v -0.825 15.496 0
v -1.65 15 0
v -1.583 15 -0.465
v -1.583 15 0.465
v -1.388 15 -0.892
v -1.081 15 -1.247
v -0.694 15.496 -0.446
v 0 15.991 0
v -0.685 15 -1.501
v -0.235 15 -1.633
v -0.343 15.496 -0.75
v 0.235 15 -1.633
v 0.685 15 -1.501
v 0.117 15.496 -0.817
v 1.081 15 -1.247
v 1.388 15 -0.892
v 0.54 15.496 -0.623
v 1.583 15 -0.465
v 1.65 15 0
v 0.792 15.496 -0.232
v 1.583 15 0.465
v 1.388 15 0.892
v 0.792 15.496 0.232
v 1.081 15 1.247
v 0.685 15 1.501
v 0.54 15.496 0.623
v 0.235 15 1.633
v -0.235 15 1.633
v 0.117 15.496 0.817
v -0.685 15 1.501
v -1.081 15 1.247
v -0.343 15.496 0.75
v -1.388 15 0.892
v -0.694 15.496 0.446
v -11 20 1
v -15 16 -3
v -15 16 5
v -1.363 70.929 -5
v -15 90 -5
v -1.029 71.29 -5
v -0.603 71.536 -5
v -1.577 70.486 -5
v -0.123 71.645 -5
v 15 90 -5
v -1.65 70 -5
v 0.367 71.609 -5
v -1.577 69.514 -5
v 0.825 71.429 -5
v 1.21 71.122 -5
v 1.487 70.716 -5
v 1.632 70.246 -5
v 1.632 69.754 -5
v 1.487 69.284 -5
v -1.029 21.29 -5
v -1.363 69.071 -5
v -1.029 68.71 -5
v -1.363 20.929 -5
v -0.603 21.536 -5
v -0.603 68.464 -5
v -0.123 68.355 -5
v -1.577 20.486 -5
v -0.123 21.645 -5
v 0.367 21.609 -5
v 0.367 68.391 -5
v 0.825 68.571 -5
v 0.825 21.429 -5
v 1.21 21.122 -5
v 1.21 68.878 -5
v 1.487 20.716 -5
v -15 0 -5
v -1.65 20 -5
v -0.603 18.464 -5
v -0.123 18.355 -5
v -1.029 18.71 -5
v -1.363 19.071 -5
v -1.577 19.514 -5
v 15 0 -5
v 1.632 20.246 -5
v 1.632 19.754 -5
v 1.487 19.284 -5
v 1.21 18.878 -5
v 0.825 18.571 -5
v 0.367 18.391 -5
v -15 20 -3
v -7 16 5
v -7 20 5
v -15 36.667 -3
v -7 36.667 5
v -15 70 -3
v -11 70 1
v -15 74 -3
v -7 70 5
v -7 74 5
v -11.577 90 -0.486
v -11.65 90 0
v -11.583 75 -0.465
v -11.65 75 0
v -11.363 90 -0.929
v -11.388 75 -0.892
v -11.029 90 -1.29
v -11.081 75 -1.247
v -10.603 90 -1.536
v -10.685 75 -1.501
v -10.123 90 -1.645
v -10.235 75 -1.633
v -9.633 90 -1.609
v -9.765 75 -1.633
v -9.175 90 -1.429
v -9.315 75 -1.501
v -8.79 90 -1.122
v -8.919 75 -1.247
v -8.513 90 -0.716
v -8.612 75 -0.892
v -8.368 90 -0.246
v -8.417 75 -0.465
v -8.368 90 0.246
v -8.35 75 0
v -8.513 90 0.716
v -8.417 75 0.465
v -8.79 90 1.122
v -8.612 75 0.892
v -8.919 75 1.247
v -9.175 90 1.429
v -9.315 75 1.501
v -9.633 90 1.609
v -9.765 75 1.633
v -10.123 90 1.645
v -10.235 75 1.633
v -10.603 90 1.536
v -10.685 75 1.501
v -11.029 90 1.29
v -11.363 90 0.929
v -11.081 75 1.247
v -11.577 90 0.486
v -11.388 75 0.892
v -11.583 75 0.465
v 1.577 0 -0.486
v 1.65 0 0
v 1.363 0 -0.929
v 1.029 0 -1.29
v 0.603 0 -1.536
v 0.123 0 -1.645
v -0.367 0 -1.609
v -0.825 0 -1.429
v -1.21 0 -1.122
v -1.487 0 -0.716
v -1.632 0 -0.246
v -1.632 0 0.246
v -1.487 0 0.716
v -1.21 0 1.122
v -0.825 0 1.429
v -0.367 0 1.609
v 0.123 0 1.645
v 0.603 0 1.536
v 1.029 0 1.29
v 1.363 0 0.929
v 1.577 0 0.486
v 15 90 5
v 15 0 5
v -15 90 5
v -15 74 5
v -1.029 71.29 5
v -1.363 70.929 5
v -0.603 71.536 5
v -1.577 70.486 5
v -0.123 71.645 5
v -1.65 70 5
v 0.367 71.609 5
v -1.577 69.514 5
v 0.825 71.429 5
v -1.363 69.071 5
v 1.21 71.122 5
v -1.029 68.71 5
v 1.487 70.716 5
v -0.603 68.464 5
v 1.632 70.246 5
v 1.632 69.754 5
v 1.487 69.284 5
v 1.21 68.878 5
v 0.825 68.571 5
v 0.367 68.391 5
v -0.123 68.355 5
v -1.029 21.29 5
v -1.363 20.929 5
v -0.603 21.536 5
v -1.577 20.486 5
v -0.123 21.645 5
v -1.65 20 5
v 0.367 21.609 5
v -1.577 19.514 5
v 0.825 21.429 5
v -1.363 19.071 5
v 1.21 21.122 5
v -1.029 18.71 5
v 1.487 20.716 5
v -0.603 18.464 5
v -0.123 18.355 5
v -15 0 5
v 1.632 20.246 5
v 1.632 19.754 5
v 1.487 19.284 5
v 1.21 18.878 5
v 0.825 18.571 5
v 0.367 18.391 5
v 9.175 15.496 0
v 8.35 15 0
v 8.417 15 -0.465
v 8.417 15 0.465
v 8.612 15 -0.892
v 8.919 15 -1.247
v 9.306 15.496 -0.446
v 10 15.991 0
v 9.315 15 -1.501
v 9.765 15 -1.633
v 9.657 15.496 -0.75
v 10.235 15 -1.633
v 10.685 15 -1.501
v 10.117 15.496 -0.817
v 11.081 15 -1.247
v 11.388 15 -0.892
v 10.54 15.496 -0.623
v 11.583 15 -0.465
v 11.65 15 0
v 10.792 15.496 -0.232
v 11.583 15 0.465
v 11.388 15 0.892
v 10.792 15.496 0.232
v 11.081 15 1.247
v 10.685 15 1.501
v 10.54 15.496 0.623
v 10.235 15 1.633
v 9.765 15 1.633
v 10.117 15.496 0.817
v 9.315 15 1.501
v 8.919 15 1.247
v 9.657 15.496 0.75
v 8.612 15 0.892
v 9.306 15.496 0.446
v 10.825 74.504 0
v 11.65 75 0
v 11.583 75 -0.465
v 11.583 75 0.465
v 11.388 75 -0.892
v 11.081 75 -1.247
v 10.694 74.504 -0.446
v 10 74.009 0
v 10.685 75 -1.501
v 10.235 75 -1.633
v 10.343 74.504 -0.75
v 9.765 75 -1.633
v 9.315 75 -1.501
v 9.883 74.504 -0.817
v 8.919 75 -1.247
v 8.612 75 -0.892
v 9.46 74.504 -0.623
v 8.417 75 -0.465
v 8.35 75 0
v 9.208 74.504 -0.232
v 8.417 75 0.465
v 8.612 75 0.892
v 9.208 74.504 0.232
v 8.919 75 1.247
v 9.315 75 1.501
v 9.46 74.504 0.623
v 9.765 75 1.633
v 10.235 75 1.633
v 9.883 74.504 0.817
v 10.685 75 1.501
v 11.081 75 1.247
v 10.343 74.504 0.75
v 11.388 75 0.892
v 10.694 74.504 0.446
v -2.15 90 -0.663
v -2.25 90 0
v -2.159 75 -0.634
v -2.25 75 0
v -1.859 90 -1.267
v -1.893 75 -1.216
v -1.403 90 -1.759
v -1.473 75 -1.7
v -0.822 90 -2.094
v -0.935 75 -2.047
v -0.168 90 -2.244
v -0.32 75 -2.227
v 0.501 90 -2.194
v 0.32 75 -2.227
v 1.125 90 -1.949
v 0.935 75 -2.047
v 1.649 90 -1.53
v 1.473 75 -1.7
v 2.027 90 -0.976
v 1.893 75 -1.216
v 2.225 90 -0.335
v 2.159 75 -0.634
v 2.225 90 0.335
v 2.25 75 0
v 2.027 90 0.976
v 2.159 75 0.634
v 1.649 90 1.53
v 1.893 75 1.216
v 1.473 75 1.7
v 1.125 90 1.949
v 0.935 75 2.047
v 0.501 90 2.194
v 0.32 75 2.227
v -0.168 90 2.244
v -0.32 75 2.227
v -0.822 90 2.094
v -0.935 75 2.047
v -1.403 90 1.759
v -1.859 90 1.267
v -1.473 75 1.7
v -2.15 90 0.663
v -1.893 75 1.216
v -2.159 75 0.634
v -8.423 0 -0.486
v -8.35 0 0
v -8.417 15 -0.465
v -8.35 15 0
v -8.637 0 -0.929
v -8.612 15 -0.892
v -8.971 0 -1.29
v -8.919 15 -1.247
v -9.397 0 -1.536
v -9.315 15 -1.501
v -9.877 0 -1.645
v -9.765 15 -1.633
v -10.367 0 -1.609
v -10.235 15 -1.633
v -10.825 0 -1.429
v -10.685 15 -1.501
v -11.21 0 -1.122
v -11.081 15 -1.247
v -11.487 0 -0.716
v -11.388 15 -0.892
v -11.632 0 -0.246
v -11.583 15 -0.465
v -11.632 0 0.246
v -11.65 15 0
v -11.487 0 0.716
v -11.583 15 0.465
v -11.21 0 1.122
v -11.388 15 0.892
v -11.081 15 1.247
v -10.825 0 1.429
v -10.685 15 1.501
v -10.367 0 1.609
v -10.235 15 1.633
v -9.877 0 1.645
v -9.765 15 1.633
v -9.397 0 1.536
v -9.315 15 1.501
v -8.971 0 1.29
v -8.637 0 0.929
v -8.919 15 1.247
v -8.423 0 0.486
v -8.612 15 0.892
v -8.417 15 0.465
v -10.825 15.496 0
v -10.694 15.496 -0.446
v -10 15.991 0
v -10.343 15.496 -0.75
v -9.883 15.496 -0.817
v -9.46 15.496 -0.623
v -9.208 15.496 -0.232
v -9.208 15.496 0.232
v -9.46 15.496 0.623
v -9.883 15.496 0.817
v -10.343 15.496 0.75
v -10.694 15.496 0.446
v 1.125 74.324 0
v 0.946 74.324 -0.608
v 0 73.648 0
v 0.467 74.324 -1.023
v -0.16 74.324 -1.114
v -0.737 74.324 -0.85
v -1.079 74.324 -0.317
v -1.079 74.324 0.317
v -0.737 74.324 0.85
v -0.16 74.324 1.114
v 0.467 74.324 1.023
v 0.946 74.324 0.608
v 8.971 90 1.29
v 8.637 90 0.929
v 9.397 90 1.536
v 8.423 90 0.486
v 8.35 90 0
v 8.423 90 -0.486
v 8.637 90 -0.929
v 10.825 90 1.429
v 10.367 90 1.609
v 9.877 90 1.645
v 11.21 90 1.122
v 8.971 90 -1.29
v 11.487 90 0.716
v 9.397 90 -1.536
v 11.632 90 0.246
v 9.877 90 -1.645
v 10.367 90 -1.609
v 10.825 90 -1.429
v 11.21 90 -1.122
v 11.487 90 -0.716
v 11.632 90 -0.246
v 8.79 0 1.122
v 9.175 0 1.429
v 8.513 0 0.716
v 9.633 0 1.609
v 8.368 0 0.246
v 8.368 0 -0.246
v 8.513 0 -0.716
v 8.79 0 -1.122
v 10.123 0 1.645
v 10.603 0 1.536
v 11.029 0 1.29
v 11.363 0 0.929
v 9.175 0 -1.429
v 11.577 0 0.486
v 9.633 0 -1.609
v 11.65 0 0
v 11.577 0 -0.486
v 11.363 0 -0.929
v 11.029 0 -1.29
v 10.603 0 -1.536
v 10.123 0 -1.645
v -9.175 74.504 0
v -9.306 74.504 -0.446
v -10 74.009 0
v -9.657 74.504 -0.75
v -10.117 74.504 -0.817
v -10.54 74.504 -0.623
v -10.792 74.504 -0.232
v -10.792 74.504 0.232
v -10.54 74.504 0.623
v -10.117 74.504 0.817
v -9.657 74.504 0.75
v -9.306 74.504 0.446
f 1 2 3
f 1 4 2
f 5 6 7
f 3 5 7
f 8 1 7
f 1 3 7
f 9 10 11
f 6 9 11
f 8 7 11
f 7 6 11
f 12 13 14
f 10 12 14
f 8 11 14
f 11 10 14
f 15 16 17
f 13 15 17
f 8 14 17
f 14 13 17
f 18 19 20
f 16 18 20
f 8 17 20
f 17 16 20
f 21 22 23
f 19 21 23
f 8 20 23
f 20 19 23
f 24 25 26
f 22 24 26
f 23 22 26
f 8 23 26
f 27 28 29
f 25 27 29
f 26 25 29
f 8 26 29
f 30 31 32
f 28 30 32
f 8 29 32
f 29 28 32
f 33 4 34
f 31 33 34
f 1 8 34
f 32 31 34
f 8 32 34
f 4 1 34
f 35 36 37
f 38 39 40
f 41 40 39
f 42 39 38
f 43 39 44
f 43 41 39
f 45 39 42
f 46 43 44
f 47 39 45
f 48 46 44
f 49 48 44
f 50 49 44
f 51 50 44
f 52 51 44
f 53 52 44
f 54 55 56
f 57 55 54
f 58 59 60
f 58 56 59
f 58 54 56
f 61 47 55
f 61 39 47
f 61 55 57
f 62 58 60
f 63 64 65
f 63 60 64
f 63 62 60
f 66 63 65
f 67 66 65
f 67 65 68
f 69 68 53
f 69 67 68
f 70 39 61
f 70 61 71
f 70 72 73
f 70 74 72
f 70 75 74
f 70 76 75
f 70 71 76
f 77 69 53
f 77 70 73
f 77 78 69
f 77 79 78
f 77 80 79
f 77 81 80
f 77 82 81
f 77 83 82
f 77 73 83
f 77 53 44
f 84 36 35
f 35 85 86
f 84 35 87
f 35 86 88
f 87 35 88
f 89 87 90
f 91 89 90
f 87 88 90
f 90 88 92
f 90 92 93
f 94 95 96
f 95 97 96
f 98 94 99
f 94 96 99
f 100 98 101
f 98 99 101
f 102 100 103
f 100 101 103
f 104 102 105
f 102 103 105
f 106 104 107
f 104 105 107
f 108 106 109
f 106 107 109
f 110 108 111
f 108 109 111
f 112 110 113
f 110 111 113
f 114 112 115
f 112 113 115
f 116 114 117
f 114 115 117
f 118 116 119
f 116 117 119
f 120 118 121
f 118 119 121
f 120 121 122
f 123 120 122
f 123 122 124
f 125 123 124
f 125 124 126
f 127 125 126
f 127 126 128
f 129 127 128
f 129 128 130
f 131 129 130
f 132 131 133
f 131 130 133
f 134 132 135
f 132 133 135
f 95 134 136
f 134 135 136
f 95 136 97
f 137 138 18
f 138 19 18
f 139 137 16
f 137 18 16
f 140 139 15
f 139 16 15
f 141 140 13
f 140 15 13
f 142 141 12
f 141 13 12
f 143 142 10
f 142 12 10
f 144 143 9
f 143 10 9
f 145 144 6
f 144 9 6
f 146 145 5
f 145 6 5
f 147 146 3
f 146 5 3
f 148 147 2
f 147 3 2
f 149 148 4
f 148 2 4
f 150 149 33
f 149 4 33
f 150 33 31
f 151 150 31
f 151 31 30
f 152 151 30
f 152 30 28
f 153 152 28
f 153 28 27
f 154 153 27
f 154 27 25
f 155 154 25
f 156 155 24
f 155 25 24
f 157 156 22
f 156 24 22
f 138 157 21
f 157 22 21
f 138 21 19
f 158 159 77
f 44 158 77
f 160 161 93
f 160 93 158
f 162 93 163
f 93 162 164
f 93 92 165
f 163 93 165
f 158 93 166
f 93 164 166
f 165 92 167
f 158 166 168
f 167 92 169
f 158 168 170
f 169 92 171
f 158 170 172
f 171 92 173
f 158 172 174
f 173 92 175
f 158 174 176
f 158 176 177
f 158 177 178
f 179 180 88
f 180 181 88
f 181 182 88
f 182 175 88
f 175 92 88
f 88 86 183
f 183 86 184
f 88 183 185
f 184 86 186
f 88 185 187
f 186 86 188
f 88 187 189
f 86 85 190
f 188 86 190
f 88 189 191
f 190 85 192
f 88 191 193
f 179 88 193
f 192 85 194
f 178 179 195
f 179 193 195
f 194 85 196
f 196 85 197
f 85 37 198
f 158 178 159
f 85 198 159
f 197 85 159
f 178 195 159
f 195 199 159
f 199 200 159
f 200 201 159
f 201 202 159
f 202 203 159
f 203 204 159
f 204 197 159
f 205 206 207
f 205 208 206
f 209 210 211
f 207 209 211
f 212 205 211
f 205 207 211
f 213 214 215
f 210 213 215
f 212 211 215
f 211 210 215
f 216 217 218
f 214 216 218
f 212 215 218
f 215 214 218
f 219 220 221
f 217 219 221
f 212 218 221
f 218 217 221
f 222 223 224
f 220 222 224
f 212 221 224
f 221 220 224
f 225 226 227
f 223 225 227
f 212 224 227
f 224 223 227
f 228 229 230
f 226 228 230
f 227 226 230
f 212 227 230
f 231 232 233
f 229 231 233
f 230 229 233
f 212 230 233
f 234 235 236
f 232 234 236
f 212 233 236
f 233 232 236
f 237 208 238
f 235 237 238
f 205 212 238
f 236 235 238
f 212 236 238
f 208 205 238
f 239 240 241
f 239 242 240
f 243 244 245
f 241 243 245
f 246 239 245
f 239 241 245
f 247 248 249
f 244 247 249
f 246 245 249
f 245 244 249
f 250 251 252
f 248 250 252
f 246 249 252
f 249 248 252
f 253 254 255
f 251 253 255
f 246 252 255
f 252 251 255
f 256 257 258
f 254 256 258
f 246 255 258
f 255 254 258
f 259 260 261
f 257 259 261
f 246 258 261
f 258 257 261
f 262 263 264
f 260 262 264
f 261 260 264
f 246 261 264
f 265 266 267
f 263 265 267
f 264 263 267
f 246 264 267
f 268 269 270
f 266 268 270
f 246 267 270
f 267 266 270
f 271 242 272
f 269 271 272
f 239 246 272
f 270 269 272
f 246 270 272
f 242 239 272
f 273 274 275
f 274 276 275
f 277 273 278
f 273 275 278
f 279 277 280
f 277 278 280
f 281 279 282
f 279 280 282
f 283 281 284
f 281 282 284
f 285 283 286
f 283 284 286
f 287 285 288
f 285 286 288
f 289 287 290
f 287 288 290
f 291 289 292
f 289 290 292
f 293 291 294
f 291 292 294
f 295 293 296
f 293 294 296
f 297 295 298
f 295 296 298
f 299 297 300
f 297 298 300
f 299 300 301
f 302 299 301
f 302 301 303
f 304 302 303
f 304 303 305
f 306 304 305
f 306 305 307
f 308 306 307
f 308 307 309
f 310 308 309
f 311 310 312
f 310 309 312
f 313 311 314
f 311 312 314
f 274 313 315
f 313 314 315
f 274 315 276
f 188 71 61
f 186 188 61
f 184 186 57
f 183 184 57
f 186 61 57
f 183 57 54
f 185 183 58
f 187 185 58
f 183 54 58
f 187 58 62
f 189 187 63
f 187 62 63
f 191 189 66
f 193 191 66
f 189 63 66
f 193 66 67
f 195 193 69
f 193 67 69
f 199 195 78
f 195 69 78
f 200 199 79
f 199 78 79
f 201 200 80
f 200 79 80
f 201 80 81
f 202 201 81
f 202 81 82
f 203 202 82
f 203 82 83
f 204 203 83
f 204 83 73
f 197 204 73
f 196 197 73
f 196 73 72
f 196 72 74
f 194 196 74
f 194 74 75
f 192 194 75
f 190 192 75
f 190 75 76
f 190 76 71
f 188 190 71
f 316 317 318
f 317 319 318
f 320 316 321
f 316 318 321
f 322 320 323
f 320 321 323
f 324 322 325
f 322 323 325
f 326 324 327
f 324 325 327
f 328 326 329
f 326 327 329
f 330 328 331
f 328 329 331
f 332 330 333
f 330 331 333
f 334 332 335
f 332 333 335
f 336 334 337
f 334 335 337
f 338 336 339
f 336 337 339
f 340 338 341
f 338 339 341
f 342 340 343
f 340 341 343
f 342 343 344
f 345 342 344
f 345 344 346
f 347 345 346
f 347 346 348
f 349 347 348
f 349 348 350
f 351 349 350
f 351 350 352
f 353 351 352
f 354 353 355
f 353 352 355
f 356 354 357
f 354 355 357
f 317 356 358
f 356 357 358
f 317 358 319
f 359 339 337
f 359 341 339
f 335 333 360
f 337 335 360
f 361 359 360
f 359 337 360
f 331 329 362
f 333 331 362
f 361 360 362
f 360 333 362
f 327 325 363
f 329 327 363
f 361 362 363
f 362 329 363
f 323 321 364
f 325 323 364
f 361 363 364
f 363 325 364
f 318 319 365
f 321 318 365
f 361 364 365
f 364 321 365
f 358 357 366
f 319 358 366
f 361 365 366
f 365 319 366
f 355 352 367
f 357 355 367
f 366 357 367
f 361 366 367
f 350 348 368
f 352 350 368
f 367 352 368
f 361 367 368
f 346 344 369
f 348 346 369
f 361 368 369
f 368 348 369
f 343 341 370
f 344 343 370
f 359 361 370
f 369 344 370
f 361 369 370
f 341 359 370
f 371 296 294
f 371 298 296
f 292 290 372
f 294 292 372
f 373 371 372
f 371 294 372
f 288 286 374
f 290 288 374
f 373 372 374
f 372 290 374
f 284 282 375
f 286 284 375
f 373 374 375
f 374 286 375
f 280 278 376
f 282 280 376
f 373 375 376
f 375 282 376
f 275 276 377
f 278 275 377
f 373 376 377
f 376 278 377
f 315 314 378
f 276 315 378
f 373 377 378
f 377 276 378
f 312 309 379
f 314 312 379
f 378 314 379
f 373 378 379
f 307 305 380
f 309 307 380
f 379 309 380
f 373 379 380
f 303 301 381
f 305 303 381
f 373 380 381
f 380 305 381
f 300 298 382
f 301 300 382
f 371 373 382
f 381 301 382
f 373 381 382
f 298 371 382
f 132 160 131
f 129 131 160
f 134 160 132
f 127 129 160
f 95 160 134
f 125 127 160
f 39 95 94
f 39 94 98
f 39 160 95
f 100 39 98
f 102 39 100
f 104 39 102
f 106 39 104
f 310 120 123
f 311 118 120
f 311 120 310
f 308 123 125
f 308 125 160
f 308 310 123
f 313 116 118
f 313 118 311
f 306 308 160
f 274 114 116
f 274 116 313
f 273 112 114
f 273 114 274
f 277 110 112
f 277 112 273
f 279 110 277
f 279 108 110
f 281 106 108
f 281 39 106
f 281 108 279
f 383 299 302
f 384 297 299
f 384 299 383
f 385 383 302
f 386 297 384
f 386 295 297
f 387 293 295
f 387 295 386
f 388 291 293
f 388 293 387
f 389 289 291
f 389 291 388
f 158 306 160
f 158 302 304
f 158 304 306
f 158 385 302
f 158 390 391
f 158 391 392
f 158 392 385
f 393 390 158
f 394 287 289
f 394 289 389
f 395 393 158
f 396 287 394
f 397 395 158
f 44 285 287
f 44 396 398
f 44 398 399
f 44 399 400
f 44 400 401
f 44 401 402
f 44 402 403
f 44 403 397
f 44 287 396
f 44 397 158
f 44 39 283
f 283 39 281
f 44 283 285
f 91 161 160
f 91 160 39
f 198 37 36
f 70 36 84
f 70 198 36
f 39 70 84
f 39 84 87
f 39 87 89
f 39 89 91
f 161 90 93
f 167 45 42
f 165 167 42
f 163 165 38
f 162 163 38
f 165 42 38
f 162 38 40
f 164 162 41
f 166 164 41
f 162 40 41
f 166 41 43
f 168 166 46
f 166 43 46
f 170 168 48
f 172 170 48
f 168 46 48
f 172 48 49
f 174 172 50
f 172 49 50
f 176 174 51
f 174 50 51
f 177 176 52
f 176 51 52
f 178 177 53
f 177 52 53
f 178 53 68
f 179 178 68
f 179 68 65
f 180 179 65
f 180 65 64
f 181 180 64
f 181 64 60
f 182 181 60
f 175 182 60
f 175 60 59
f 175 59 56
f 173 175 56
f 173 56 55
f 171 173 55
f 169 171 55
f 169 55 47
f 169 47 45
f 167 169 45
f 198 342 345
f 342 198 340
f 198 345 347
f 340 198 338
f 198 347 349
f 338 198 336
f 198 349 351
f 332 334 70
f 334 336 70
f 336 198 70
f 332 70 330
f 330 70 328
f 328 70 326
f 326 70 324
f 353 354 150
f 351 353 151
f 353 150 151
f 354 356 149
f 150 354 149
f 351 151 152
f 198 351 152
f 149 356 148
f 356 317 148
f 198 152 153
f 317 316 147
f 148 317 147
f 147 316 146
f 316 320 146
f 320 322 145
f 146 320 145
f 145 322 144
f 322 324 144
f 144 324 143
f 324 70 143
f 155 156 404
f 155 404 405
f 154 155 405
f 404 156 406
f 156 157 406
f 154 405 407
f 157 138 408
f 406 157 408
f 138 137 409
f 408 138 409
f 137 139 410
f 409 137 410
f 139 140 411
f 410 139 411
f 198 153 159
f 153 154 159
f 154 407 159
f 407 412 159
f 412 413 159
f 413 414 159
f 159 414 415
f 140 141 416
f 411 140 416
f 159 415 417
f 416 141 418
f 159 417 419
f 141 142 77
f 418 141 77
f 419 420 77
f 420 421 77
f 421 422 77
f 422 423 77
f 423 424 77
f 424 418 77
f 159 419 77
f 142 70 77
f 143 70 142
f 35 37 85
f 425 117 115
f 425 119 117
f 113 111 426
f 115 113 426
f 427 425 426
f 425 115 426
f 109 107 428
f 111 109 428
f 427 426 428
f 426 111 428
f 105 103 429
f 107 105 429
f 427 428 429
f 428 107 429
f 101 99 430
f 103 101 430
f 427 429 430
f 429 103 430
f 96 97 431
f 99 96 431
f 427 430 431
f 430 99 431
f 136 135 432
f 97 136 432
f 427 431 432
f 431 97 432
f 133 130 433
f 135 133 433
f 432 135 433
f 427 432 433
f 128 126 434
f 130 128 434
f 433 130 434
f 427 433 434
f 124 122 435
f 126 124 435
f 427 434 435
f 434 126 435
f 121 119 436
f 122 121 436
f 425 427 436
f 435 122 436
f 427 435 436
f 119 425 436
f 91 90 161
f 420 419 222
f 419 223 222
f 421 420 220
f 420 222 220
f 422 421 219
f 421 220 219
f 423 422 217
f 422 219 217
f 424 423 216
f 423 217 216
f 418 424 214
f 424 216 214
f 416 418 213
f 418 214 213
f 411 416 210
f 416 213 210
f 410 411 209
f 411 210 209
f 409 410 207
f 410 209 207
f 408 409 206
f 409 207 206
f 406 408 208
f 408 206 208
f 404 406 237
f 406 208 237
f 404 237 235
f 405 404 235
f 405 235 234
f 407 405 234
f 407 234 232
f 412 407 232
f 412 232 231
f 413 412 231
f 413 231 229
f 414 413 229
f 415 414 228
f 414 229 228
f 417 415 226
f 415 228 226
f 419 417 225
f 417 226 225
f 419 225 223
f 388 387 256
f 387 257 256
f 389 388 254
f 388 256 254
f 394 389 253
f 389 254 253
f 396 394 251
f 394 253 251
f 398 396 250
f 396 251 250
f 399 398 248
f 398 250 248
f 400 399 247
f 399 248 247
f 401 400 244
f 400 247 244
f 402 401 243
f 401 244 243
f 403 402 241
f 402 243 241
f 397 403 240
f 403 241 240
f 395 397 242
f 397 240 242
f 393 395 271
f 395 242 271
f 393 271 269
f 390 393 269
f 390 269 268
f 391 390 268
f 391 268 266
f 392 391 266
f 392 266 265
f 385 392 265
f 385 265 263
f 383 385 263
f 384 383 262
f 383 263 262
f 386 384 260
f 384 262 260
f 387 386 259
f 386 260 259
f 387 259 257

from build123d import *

# Parameters (mm, degrees)
SKETCH1_W                 = 30
SKETCH1_H                 = 10
BOSS_EXTRUDE1_DEPTH       = 90
M4X0_7_TAPPED_HOLE1_D     = 3.3
M4X0_7_TAPPED_HOLE1_DEPTH = 15
M4X0_7_TAPPED_HOLE1_TIP   = 0.991420021
M4X0_7_TAPPED_HOLE2_D     = 3.3
M4X0_7_TAPPED_HOLE2_DEPTH = 15
M4X0_7_TAPPED_HOLE2_TIP   = 0.991420021
M4X0_7_TAPPED_HOLE3_D     = 3.3
M4_CLEARANCE_HOLE1_D      = 4.5
M4_CLEARANCE_HOLE1_DEPTH  = 15
M4_CLEARANCE_HOLE1_TIP    = 1.351936393
SKETCH13_W                = 8
SKETCH13_H                = 50
CUT_EXTRUDE1_DEPTH        = 8
CHAMFER4_SIZE             = 8
CHAMFER5_SIZE             = 4


# Some blends are built 0.0001 mm under size
with BuildPart() as part:
    # Sketch1 → Boss-Extrude1 (new body)
    with BuildSketch(Plane(origin=(0, 0, 0), x_dir=(1, 0, 0), z_dir=(0, 1, 0))):
        Rectangle(SKETCH1_W, SKETCH1_H)
    extrude(amount=BOSS_EXTRUDE1_DEPTH)

    # M4x0.7 Tapped Hole1
    with Locations(Plane(origin=(0, 0, 0), x_dir=(-1, 0, 0), z_dir=(0, -1, 0))):
        with Locations((-10, 0), (10, 0), (0, 0)):
            Hole(M4X0_7_TAPPED_HOLE1_D / 2, depth=M4X0_7_TAPPED_HOLE1_DEPTH)
            with Locations((0, 0, -(M4X0_7_TAPPED_HOLE1_DEPTH + M4X0_7_TAPPED_HOLE1_TIP / 2))):  # 118° drill point
                Cone(0, M4X0_7_TAPPED_HOLE1_D / 2, M4X0_7_TAPPED_HOLE1_TIP, mode=Mode.SUBTRACT)

    # M4x0.7 Tapped Hole2
    with Locations(Plane(origin=(0, 90, 0), x_dir=(1, 0, 0), z_dir=(0, 1, 0))):
        with Locations((-10, 0), (10, 0)):
            Hole(M4X0_7_TAPPED_HOLE2_D / 2, depth=M4X0_7_TAPPED_HOLE2_DEPTH)
            with Locations((0, 0, -(M4X0_7_TAPPED_HOLE2_DEPTH + M4X0_7_TAPPED_HOLE2_TIP / 2))):  # 118° drill point
                Cone(0, M4X0_7_TAPPED_HOLE2_D / 2, M4X0_7_TAPPED_HOLE2_TIP, mode=Mode.SUBTRACT)

    # M4x0.7 Tapped Hole3 (through all)
    with Locations(Plane.XY.offset(5)):
        with Locations((0, 70), (0, 20)):
            Hole(M4X0_7_TAPPED_HOLE3_D / 2)

    # M4 Clearance Hole1
    with Locations(Plane(origin=(0, 90, 0), x_dir=(1, 0, 0), z_dir=(0, 1, 0))):
        with Locations((0, 0)):
            Hole(M4_CLEARANCE_HOLE1_D / 2, depth=M4_CLEARANCE_HOLE1_DEPTH)
            with Locations((0, 0, -(M4_CLEARANCE_HOLE1_DEPTH + M4_CLEARANCE_HOLE1_TIP / 2))):  # 118° drill point
                Cone(0, M4_CLEARANCE_HOLE1_D / 2, M4_CLEARANCE_HOLE1_TIP, mode=Mode.SUBTRACT)

    # Sketch13 → Cut-Extrude1 (cut)
    with BuildSketch(Plane.ZY.offset(15)):
        with Locations((1, 45)):
            Rectangle(SKETCH13_W, SKETCH13_H)
    extrude(amount=-CUT_EXTRUDE1_DEPTH, mode=Mode.SUBTRACT)

    # Chamfer4
    chamfer4_edges = [part.edges().sort_by_distance(p)[0] for p in [
        (-7, 45, -3),
    ]]
    chamfer(chamfer4_edges, length=CHAMFER4_SIZE - 0.0001)  # a hair under: the kernel refuses the full size

    # Chamfer5
    # the kernel refuses this chamfer: 4 mm, written as the material it takes off along each edge
    with BuildSketch(Plane(origin=(-25.286731952, 20, 5), x_dir=(0, -0.9996219169112968, 0.02749587661058627), z_dir=(1, 0, 0))) as chamfer5_piece_1_section:
        Polygon((CHAMFER5_SIZE * 0.999621916911, CHAMFER5_SIZE * 0.0274958766106), (-CHAMFER5_SIZE * 0.0274958766106, CHAMFER5_SIZE * 0.999621916911), (0, 0), align=None)
    chamfer5_piece_1 = extrude(amount=18.286731952, mode=Mode.PRIVATE)
    chamfer5_piece_1 = split(chamfer5_piece_1, bisect_by=Plane(origin=(-9.899926501, 18.600001, 2.099973499), z_dir=(-0.7071067811865476, 0, 0.7071067811865476)), keep=Keep.TOP, mode=Mode.PRIVATE)
    add(chamfer5_piece_1, mode=Mode.SUBTRACT)
    with BuildSketch(Plane(origin=(-15, 20, -3), x_dir=(-0.027495876610586487, -0.9996219169112968, 0), z_dir=(0, 0, 1))) as chamfer5_piece_2_section:
        Polygon((CHAMFER5_SIZE * 0.999621916911, CHAMFER5_SIZE * 0.0274958766106), (-CHAMFER5_SIZE * 0.0274958766106, CHAMFER5_SIZE * 0.999621916911), (0, 0), align=None)
    chamfer5_piece_2 = extrude(amount=18.286731952, mode=Mode.PRIVATE)
    chamfer5_piece_2 = split(chamfer5_piece_2, bisect_by=Plane(origin=(-12.099973499, 18.600001, -0.100073499), z_dir=(-0.7071067811865476, 0, 0.7071067811865476)), keep=Keep.TOP, mode=Mode.PRIVATE)
    add(chamfer5_piece_2, mode=Mode.SUBTRACT)
    with BuildSketch(Plane(origin=(-25.286731952, 70, 5), x_dir=(0, -0.027495876610585623, -0.9996219169112968), z_dir=(1, 0, 0))) as chamfer5_piece_3_section:
        Polygon((CHAMFER5_SIZE * 0.999621916911, CHAMFER5_SIZE * 0.0274958766106), (-CHAMFER5_SIZE * 0.0274958766106, CHAMFER5_SIZE * 0.999621916911), (0, 0), align=None)
    chamfer5_piece_3 = extrude(amount=18.286731952, mode=Mode.PRIVATE)
    chamfer5_piece_3 = split(chamfer5_piece_3, bisect_by=Plane(origin=(-9.899926501, 71.399999, 2.099973499), z_dir=(-0.7071067811865476, 0, 0.7071067811865476)), keep=Keep.TOP, mode=Mode.PRIVATE)
    add(chamfer5_piece_3, mode=Mode.SUBTRACT)
    with BuildSketch(Plane(origin=(-15, 70, 15.286731952), x_dir=(0.9996219169112968, -0.027495876610585623, 0), z_dir=(0, 0, -1))) as chamfer5_piece_4_section:
        Polygon((CHAMFER5_SIZE * 0.999621916911, -CHAMFER5_SIZE * 0.0274958766106), (-CHAMFER5_SIZE * 0.0274958766106, -CHAMFER5_SIZE * 0.999621916911), (0, 0), align=None)
    chamfer5_piece_4 = extrude(amount=18.286731952, mode=Mode.PRIVATE)
    chamfer5_piece_4 = split(chamfer5_piece_4, bisect_by=Plane(origin=(-12.099973499, 71.399999, -0.100073499), z_dir=(-0.7071067811865476, 0, 0.7071067811865476)), keep=Keep.TOP, mode=Mode.PRIVATE)
    add(chamfer5_piece_4, mode=Mode.SUBTRACT)


solid = part.part
